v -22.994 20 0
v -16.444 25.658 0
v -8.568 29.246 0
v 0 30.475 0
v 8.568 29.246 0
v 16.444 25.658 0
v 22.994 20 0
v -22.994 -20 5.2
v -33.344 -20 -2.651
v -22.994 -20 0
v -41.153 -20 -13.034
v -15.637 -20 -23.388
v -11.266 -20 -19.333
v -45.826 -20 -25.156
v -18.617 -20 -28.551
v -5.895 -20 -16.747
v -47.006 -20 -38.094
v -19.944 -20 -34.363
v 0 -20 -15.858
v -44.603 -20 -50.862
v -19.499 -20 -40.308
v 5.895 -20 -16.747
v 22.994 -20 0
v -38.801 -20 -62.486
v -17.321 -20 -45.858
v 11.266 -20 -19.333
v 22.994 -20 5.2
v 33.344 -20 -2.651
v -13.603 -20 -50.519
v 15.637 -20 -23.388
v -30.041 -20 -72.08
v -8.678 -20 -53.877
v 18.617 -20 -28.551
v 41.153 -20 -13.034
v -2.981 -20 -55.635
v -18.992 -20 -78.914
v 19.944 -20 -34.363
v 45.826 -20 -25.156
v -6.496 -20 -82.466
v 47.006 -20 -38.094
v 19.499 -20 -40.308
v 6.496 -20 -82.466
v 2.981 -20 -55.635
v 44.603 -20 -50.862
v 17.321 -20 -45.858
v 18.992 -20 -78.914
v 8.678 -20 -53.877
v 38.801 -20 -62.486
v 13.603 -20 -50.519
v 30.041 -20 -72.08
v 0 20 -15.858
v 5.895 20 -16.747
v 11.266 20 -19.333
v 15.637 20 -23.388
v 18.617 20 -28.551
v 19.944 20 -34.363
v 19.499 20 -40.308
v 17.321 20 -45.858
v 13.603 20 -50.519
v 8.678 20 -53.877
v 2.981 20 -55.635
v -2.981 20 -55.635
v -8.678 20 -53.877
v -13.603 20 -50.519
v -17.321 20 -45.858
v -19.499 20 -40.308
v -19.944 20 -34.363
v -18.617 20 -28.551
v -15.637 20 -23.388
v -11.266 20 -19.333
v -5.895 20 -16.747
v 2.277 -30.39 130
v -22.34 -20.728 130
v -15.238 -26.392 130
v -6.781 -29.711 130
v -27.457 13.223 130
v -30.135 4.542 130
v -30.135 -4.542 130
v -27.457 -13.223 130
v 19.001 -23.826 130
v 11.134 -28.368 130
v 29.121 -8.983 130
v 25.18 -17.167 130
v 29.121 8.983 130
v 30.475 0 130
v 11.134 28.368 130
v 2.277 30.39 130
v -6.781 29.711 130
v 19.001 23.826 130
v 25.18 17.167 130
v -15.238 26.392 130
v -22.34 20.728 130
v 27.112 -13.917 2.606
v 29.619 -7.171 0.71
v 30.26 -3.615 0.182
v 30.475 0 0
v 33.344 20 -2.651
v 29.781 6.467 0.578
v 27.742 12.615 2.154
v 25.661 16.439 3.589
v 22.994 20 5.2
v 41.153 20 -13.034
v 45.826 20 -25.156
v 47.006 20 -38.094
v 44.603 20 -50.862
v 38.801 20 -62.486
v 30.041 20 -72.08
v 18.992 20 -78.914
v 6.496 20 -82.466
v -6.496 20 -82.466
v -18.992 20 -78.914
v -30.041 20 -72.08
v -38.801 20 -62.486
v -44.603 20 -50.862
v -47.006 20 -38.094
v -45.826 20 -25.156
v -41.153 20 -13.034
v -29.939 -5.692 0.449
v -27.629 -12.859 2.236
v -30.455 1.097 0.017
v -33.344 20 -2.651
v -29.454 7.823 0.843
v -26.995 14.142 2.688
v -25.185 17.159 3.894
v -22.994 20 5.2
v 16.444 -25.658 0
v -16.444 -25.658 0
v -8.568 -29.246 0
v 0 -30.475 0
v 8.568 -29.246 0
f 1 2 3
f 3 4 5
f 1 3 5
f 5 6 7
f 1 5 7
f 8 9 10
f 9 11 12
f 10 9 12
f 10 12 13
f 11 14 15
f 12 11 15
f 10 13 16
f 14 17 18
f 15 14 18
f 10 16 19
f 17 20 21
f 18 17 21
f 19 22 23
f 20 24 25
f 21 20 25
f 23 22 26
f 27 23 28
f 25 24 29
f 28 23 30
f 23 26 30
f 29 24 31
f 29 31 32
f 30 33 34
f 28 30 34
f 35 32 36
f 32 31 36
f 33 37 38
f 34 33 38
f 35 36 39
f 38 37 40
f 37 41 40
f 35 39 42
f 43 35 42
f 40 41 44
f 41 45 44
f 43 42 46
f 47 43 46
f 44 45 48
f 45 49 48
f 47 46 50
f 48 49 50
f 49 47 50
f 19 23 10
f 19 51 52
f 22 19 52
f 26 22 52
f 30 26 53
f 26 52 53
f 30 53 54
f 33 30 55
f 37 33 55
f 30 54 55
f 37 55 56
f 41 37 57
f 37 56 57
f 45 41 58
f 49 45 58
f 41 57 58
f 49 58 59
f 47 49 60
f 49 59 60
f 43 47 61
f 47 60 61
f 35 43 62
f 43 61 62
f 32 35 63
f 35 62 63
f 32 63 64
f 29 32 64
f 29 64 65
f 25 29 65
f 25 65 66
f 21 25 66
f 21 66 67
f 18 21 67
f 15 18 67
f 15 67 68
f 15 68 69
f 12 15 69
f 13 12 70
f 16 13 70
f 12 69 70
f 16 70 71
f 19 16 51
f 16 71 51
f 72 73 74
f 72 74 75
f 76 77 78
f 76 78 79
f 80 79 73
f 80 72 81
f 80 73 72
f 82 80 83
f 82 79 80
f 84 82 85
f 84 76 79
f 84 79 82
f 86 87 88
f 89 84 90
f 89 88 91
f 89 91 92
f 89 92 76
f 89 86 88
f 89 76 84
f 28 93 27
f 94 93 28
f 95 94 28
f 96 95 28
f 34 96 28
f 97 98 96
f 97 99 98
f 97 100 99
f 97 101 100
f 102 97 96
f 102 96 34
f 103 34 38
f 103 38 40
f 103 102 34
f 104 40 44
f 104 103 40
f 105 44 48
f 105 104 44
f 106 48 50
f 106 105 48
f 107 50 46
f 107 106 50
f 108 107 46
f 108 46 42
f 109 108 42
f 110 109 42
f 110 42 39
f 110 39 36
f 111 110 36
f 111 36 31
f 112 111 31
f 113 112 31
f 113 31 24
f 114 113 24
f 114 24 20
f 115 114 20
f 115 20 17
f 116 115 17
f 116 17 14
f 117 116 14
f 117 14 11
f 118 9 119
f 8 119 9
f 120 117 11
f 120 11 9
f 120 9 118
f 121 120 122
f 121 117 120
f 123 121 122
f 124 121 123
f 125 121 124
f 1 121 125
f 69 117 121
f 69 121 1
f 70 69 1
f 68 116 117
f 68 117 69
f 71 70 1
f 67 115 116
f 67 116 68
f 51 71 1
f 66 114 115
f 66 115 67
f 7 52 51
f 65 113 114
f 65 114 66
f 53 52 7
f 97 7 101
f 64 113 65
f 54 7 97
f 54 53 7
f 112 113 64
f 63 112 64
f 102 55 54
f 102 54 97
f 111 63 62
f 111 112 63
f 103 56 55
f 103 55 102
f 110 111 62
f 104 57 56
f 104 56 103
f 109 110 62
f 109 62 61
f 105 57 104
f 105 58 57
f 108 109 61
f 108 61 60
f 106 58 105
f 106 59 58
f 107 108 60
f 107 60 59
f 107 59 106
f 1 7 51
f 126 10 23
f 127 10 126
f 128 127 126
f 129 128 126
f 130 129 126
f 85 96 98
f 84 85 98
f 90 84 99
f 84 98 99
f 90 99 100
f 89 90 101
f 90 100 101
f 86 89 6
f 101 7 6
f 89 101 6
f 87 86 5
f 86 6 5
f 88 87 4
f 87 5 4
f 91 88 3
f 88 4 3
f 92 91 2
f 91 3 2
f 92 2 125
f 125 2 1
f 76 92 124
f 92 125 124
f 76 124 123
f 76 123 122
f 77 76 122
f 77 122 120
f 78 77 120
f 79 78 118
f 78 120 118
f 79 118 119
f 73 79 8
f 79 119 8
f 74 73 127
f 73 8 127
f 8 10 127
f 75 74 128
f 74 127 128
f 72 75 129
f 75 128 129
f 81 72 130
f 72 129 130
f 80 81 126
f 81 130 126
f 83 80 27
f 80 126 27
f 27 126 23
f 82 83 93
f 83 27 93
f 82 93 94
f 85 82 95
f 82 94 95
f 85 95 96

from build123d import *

# Parameters (mm, degrees)
SKETCH1_R           = 30.475
BOSS_EXTRUDE1_DEPTH = 130
SKETCH2_R           = 47.05874864
BOSS_EXTRUDE2_DEPTH = 20
SKETCH8_R           = 20
CUT_EXTRUDE1_DEPTH  = 40


with BuildPart() as part:
    # Sketch1 → Boss-Extrude1 (new body)
    with BuildSketch(Plane.XY):
        Circle(SKETCH1_R)
    extrude(amount=BOSS_EXTRUDE1_DEPTH)

    # Sketch2 → Boss-Extrude2 (add, symmetric)
    with BuildSketch(Plane(origin=(0, 0, 0), x_dir=(1, 0, 0), z_dir=(0, 1, 0))):
        with Locations((0, 35.858056257)):
            Circle(SKETCH2_R)
    extrude(amount=BOSS_EXTRUDE2_DEPTH, both=True)

    # Sketch8 → Cut-Extrude1 (cut)
    with BuildSketch(Plane(origin=(0, 20, 0), x_dir=(1, 0, 0), z_dir=(0, 1, 0))):
        with Locations(Location((0, 35.858056257, 0), (0, 0, 270))):
            Circle(SKETCH8_R)
    extrude(amount=-CUT_EXTRUDE1_DEPTH, mode=Mode.SUBTRACT)


solid = part.part
